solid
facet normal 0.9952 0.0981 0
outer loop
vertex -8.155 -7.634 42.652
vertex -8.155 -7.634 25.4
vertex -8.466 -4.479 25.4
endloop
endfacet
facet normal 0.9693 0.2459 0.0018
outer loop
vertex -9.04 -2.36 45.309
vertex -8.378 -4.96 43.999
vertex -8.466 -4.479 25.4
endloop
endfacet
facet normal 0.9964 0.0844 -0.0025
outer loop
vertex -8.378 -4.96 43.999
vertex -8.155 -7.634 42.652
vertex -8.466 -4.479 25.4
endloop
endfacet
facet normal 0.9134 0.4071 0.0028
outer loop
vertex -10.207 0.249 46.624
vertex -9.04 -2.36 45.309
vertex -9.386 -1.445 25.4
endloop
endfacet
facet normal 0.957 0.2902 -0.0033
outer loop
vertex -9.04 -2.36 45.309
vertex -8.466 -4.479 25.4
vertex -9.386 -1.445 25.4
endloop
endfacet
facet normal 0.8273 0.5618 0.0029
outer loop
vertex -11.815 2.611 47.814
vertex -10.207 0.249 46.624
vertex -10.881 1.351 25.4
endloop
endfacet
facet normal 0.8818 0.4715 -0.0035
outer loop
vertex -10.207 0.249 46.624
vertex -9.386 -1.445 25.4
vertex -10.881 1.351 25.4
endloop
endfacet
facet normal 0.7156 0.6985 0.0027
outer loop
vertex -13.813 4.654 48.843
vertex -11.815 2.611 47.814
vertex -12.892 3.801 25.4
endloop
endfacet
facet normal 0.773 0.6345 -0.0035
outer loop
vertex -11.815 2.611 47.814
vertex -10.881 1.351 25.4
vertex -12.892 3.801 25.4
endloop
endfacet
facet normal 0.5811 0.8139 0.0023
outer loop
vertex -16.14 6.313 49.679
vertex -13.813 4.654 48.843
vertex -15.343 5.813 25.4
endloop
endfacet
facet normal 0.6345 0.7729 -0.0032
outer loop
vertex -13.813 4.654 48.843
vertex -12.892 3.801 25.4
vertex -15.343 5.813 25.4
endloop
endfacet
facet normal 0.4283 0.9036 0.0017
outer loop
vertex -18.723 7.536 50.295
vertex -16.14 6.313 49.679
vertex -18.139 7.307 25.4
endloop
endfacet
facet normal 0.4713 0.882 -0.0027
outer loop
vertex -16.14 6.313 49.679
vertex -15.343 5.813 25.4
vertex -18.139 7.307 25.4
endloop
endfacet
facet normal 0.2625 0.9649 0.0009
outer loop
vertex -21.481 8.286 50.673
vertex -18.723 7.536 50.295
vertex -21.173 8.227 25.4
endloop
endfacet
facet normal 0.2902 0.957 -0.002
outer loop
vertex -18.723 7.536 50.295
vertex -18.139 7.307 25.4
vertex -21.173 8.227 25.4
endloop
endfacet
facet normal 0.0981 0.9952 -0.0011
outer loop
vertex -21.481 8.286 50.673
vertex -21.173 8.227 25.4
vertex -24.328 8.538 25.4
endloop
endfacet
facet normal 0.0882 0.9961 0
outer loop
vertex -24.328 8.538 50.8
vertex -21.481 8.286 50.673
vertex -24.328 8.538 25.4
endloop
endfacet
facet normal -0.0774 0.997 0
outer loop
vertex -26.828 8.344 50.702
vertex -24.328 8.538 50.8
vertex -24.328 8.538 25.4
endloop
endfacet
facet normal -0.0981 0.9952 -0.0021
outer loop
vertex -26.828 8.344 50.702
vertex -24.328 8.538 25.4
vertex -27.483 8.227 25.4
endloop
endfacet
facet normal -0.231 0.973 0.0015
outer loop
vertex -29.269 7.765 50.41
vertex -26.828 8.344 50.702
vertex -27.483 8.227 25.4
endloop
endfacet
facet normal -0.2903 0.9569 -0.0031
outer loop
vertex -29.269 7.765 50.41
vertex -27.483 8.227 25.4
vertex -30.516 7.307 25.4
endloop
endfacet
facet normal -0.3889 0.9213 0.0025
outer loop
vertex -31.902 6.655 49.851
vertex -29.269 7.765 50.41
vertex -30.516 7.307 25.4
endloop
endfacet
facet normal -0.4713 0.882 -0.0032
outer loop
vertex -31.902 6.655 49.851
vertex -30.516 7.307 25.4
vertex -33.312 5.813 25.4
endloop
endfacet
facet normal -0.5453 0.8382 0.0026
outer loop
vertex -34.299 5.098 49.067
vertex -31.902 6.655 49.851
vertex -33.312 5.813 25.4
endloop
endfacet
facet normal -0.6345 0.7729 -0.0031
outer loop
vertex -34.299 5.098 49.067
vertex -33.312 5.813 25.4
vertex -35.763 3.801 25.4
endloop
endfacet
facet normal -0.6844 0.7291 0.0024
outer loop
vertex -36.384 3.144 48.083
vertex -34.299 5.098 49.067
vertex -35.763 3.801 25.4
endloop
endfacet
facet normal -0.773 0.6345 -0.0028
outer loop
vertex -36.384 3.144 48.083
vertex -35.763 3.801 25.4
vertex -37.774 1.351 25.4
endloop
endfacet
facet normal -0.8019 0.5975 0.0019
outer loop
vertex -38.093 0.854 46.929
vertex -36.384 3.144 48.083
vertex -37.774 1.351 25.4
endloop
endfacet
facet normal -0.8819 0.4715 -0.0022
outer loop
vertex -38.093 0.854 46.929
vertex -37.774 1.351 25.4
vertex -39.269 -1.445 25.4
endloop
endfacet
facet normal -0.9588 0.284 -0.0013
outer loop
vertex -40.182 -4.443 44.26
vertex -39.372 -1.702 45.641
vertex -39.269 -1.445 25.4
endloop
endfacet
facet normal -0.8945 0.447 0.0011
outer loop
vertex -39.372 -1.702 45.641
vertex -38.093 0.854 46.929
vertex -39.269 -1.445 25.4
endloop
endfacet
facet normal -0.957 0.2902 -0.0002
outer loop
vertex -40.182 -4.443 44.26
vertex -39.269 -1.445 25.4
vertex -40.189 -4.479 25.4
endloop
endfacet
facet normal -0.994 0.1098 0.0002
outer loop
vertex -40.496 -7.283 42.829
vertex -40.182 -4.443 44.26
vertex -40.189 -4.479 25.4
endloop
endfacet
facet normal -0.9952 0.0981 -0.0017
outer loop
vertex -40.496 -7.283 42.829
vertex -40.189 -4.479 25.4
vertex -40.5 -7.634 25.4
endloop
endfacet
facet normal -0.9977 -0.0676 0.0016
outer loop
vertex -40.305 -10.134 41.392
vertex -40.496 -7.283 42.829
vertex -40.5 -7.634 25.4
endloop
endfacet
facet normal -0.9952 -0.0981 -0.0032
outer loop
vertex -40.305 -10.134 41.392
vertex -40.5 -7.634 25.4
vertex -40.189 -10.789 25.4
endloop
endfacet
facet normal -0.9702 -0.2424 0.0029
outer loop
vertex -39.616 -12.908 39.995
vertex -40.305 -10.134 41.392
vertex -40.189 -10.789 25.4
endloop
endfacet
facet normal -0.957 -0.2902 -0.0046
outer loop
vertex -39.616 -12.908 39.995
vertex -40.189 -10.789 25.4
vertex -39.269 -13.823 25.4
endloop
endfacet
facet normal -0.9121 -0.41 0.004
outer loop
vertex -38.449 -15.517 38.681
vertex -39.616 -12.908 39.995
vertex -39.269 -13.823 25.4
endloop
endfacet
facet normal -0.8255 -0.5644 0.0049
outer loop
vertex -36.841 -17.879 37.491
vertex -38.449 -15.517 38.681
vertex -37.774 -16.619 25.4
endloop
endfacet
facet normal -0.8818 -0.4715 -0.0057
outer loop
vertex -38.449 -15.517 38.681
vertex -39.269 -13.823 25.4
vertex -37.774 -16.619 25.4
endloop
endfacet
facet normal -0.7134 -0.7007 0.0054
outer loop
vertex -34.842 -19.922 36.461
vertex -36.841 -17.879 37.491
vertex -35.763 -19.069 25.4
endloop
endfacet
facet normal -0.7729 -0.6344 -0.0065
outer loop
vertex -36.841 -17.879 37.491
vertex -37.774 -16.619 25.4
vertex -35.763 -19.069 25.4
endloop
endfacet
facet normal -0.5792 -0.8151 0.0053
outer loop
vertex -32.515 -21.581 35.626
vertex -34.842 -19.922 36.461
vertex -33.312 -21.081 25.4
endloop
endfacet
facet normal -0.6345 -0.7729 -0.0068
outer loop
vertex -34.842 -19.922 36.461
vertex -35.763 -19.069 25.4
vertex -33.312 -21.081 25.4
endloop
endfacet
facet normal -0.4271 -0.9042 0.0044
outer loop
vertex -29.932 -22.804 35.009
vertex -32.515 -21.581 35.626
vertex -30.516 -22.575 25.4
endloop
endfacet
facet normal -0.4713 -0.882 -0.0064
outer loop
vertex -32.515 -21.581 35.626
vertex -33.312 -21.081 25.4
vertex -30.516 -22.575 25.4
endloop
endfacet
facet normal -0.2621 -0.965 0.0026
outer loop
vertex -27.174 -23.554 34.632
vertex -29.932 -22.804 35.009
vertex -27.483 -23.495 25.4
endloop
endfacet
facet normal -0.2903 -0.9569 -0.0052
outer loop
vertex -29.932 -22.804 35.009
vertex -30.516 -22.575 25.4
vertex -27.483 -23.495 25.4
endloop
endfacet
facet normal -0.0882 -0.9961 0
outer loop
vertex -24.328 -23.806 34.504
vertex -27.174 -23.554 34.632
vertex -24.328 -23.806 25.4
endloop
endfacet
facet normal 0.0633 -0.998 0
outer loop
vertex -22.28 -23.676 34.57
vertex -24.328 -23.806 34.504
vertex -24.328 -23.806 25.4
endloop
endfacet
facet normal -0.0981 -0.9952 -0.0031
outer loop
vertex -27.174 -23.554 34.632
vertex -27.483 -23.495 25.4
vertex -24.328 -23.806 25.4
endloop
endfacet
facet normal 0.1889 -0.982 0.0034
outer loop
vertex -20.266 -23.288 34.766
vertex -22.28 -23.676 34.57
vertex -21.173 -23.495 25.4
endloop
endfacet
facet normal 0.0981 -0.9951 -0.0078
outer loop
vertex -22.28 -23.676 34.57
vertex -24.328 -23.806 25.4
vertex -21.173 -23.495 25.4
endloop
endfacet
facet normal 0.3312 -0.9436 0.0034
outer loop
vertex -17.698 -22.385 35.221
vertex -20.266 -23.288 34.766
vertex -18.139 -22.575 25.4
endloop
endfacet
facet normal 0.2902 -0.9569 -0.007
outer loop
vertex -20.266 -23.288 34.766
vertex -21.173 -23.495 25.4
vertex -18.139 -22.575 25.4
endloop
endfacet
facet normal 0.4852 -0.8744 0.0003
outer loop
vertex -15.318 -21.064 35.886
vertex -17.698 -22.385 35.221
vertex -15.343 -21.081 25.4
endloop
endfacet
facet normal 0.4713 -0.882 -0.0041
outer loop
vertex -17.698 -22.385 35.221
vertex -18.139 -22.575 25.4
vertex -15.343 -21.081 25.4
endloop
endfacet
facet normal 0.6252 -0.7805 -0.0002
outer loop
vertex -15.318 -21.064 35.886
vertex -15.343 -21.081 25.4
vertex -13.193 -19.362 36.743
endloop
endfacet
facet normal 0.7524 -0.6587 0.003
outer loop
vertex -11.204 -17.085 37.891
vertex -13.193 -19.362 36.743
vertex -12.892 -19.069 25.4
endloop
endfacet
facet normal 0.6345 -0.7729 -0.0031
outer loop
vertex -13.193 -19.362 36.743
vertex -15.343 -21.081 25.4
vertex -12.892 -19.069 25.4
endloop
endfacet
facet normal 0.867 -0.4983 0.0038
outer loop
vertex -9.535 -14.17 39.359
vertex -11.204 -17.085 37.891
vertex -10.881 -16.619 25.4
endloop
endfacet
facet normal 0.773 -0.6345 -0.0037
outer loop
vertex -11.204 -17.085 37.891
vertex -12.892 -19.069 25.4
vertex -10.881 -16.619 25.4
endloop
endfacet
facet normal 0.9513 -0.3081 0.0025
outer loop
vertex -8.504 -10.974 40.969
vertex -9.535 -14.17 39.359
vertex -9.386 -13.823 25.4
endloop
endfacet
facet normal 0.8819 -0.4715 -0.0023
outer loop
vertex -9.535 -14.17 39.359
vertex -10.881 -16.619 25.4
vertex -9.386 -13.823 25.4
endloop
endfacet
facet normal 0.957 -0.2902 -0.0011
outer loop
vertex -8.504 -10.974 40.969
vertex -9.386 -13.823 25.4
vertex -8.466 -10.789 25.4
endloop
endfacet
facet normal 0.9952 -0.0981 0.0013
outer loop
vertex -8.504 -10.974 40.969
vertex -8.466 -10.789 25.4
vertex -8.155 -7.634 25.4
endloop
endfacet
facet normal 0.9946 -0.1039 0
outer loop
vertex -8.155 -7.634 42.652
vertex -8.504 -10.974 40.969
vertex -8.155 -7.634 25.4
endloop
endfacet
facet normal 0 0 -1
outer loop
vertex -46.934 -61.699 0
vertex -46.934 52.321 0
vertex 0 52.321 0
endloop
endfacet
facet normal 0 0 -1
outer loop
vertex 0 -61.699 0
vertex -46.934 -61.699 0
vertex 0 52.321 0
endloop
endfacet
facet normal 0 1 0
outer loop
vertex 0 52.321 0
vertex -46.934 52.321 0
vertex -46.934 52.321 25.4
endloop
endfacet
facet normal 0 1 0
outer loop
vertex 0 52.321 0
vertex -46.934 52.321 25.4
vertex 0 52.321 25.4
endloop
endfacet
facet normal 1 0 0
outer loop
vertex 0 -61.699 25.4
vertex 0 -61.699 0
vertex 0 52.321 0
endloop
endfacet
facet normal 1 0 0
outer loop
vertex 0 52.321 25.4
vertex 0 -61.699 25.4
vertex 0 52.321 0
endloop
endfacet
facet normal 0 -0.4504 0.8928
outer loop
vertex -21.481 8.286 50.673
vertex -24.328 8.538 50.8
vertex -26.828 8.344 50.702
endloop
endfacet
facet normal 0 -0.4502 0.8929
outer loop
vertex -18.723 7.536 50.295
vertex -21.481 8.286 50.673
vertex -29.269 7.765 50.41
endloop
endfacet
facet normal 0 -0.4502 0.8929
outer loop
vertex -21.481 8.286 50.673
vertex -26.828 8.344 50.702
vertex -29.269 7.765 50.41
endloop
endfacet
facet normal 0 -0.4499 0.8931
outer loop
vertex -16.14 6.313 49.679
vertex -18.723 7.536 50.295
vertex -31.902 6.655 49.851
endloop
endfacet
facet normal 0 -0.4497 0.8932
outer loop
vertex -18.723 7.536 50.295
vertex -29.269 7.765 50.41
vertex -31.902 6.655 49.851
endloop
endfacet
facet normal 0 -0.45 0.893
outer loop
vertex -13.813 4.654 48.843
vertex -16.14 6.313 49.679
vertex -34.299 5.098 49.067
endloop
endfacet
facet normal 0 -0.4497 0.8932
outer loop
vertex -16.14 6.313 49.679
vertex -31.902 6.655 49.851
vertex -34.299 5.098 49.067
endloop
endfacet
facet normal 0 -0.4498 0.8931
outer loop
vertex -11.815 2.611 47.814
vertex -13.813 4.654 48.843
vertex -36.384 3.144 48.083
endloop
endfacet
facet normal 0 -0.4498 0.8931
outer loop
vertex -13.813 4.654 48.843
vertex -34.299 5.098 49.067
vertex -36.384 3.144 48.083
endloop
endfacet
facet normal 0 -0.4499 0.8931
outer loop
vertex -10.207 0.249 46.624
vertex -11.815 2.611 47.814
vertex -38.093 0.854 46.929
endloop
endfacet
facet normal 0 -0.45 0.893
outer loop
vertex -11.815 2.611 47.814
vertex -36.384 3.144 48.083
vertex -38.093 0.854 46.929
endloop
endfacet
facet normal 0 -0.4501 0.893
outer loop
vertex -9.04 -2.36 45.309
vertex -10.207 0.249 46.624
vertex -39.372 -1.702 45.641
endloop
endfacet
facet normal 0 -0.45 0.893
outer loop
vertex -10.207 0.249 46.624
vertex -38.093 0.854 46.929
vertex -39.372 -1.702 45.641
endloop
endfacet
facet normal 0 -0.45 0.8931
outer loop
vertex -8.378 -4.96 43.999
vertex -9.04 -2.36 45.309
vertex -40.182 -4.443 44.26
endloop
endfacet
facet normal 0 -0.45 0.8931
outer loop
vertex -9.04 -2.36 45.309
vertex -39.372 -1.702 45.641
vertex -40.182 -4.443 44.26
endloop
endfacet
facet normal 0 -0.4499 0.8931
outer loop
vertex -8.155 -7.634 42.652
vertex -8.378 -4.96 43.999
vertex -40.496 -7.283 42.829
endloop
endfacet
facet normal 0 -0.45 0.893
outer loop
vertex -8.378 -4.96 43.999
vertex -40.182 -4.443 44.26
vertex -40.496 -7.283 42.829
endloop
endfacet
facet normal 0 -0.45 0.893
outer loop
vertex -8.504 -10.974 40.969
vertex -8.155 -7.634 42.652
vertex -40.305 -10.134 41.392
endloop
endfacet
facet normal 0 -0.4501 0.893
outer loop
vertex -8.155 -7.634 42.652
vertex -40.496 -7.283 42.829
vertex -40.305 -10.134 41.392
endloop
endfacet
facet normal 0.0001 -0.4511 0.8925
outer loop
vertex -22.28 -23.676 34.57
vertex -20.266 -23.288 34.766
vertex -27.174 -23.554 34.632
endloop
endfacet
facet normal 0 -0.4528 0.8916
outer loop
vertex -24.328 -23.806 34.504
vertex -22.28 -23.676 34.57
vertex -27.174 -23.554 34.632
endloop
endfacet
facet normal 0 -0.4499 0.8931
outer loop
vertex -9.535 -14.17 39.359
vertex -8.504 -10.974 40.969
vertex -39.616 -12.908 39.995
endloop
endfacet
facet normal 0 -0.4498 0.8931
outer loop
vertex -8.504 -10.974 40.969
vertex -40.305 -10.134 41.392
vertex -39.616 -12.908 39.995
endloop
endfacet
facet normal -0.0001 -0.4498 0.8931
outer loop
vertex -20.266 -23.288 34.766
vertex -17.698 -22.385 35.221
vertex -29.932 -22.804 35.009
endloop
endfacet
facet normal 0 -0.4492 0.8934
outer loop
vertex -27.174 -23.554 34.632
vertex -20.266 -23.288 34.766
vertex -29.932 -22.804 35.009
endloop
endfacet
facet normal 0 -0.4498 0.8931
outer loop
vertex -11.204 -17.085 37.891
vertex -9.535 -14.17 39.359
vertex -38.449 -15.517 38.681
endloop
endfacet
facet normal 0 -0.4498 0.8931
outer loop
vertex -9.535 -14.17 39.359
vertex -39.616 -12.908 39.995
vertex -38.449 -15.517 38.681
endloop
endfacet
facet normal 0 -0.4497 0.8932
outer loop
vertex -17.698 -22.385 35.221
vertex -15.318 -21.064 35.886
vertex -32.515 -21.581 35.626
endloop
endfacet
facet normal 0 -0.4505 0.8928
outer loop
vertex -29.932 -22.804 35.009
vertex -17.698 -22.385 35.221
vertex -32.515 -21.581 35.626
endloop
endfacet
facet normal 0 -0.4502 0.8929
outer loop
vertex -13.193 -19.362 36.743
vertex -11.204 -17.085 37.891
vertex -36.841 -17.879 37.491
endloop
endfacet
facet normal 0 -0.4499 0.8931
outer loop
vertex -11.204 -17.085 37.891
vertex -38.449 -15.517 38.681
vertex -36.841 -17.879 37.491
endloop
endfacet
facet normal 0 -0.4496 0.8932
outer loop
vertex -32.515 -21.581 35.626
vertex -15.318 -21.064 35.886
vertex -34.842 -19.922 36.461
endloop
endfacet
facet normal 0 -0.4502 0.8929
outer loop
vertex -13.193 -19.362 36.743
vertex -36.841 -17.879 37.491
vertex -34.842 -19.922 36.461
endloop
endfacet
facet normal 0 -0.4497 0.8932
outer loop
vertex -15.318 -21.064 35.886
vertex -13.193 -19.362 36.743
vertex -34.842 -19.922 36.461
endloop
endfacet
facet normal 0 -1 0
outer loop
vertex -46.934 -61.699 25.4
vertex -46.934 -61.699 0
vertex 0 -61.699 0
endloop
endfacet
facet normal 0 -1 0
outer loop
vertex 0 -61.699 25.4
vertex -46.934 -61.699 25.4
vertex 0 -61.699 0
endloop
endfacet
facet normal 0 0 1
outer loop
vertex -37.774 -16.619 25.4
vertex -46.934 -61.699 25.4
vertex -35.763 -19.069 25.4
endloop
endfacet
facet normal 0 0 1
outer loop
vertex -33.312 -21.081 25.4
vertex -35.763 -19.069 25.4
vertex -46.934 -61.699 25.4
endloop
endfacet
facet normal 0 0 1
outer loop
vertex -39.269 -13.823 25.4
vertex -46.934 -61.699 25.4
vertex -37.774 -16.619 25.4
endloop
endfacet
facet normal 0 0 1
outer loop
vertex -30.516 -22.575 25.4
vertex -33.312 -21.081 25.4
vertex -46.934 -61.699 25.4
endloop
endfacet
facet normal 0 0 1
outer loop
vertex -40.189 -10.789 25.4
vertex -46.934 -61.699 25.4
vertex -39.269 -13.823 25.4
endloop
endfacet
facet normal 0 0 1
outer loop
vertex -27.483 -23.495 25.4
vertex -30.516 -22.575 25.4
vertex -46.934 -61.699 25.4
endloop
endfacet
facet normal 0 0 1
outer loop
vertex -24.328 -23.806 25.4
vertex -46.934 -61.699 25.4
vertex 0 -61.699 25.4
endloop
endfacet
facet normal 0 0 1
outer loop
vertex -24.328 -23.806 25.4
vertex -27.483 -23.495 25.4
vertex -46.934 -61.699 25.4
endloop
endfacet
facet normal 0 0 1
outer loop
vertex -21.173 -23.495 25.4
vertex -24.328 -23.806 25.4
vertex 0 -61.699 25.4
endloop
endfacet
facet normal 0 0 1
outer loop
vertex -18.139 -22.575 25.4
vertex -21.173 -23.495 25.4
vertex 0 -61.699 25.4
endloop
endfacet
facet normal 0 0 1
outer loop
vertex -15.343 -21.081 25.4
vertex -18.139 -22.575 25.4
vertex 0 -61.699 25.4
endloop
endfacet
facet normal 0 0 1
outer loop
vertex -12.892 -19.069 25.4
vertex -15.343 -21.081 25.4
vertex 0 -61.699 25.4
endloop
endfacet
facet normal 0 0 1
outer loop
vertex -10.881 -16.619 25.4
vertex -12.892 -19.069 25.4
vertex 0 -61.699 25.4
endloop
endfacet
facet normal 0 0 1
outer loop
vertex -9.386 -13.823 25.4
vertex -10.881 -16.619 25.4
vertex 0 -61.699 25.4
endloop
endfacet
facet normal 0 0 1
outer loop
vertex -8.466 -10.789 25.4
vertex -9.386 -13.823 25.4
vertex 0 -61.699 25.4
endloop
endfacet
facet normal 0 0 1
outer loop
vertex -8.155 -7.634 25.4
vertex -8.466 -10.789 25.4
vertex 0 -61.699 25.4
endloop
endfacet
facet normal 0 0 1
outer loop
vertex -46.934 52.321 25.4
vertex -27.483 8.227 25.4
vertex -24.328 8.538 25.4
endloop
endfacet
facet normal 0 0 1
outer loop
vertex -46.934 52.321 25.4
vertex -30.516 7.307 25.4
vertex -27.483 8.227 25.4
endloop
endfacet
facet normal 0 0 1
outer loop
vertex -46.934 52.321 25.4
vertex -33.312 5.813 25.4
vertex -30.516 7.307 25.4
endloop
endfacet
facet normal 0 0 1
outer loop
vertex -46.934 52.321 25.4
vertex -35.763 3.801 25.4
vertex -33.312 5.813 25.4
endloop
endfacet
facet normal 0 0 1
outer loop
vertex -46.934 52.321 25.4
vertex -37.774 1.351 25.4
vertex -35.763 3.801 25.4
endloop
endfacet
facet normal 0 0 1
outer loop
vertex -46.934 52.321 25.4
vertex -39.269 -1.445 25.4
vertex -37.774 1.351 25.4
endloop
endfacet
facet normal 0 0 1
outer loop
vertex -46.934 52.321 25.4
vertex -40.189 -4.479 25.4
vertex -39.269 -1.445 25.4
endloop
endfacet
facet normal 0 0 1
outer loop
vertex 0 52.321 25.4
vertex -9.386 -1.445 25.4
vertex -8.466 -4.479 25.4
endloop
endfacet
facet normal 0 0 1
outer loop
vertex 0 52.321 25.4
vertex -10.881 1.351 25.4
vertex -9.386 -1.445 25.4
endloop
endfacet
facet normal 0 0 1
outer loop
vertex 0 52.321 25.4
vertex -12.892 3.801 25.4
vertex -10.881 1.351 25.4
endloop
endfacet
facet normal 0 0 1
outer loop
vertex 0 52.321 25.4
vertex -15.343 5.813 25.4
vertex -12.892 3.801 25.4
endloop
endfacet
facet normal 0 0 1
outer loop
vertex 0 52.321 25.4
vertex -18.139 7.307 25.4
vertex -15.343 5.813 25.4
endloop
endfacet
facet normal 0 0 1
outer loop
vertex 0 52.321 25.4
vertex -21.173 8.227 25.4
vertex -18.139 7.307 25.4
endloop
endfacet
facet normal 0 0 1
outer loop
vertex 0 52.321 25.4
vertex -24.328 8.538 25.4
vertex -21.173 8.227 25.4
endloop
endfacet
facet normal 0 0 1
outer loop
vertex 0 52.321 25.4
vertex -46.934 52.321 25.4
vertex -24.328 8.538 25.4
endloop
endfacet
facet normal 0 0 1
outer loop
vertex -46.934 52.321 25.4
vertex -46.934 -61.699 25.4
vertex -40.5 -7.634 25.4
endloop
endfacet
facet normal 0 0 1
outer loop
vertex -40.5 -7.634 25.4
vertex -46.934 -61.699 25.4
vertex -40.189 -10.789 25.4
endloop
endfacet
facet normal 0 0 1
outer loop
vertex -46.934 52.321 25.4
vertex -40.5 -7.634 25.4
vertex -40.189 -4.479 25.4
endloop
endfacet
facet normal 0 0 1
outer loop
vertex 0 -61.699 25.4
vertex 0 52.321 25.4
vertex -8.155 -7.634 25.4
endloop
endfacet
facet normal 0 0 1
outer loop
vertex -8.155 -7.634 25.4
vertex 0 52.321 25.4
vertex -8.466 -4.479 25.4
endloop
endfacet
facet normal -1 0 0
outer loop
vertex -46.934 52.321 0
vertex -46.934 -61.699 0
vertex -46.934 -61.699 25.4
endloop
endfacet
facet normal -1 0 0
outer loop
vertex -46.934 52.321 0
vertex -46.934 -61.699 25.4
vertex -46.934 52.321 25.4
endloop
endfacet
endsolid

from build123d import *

# Parameters (mm, degrees)
F0_W     = 46.934098
F0_H     = 114.019729
F1_DEPTH = 25.4
F2_R     = 16.172155
F3_DEPTH = 25.4
F5_DEPTH = 46.935098


with BuildPart() as f1:
    # F0 (on Top) → F1 (new body)
    with BuildSketch(Plane.XY):
        with Locations((-23.467049, -4.689149)):
            Rectangle(F0_W, F0_H)
    extrude(amount=F1_DEPTH)

    # F2 (on face) → F3 (join)
    with BuildSketch(Plane.XY.offset(25.4)):
        with Locations((-24.327599, -7.633943)):
            Circle(F2_R)
    extrude(amount=F3_DEPTH)

    # F4 (on face) → F5 (cut, through all)
    with BuildSketch(Plane(origin=(-46.934098, 0, 0), x_dir=(0, -1, 0), z_dir=(-1, 0, 0))):
        Polygon((23.806098, 50.8), (-8.538212, 50.8), (23.806098, 34.50444), align=None)
    extrude(amount=-F5_DEPTH, mode=Mode.SUBTRACT)


solid = f1.part
